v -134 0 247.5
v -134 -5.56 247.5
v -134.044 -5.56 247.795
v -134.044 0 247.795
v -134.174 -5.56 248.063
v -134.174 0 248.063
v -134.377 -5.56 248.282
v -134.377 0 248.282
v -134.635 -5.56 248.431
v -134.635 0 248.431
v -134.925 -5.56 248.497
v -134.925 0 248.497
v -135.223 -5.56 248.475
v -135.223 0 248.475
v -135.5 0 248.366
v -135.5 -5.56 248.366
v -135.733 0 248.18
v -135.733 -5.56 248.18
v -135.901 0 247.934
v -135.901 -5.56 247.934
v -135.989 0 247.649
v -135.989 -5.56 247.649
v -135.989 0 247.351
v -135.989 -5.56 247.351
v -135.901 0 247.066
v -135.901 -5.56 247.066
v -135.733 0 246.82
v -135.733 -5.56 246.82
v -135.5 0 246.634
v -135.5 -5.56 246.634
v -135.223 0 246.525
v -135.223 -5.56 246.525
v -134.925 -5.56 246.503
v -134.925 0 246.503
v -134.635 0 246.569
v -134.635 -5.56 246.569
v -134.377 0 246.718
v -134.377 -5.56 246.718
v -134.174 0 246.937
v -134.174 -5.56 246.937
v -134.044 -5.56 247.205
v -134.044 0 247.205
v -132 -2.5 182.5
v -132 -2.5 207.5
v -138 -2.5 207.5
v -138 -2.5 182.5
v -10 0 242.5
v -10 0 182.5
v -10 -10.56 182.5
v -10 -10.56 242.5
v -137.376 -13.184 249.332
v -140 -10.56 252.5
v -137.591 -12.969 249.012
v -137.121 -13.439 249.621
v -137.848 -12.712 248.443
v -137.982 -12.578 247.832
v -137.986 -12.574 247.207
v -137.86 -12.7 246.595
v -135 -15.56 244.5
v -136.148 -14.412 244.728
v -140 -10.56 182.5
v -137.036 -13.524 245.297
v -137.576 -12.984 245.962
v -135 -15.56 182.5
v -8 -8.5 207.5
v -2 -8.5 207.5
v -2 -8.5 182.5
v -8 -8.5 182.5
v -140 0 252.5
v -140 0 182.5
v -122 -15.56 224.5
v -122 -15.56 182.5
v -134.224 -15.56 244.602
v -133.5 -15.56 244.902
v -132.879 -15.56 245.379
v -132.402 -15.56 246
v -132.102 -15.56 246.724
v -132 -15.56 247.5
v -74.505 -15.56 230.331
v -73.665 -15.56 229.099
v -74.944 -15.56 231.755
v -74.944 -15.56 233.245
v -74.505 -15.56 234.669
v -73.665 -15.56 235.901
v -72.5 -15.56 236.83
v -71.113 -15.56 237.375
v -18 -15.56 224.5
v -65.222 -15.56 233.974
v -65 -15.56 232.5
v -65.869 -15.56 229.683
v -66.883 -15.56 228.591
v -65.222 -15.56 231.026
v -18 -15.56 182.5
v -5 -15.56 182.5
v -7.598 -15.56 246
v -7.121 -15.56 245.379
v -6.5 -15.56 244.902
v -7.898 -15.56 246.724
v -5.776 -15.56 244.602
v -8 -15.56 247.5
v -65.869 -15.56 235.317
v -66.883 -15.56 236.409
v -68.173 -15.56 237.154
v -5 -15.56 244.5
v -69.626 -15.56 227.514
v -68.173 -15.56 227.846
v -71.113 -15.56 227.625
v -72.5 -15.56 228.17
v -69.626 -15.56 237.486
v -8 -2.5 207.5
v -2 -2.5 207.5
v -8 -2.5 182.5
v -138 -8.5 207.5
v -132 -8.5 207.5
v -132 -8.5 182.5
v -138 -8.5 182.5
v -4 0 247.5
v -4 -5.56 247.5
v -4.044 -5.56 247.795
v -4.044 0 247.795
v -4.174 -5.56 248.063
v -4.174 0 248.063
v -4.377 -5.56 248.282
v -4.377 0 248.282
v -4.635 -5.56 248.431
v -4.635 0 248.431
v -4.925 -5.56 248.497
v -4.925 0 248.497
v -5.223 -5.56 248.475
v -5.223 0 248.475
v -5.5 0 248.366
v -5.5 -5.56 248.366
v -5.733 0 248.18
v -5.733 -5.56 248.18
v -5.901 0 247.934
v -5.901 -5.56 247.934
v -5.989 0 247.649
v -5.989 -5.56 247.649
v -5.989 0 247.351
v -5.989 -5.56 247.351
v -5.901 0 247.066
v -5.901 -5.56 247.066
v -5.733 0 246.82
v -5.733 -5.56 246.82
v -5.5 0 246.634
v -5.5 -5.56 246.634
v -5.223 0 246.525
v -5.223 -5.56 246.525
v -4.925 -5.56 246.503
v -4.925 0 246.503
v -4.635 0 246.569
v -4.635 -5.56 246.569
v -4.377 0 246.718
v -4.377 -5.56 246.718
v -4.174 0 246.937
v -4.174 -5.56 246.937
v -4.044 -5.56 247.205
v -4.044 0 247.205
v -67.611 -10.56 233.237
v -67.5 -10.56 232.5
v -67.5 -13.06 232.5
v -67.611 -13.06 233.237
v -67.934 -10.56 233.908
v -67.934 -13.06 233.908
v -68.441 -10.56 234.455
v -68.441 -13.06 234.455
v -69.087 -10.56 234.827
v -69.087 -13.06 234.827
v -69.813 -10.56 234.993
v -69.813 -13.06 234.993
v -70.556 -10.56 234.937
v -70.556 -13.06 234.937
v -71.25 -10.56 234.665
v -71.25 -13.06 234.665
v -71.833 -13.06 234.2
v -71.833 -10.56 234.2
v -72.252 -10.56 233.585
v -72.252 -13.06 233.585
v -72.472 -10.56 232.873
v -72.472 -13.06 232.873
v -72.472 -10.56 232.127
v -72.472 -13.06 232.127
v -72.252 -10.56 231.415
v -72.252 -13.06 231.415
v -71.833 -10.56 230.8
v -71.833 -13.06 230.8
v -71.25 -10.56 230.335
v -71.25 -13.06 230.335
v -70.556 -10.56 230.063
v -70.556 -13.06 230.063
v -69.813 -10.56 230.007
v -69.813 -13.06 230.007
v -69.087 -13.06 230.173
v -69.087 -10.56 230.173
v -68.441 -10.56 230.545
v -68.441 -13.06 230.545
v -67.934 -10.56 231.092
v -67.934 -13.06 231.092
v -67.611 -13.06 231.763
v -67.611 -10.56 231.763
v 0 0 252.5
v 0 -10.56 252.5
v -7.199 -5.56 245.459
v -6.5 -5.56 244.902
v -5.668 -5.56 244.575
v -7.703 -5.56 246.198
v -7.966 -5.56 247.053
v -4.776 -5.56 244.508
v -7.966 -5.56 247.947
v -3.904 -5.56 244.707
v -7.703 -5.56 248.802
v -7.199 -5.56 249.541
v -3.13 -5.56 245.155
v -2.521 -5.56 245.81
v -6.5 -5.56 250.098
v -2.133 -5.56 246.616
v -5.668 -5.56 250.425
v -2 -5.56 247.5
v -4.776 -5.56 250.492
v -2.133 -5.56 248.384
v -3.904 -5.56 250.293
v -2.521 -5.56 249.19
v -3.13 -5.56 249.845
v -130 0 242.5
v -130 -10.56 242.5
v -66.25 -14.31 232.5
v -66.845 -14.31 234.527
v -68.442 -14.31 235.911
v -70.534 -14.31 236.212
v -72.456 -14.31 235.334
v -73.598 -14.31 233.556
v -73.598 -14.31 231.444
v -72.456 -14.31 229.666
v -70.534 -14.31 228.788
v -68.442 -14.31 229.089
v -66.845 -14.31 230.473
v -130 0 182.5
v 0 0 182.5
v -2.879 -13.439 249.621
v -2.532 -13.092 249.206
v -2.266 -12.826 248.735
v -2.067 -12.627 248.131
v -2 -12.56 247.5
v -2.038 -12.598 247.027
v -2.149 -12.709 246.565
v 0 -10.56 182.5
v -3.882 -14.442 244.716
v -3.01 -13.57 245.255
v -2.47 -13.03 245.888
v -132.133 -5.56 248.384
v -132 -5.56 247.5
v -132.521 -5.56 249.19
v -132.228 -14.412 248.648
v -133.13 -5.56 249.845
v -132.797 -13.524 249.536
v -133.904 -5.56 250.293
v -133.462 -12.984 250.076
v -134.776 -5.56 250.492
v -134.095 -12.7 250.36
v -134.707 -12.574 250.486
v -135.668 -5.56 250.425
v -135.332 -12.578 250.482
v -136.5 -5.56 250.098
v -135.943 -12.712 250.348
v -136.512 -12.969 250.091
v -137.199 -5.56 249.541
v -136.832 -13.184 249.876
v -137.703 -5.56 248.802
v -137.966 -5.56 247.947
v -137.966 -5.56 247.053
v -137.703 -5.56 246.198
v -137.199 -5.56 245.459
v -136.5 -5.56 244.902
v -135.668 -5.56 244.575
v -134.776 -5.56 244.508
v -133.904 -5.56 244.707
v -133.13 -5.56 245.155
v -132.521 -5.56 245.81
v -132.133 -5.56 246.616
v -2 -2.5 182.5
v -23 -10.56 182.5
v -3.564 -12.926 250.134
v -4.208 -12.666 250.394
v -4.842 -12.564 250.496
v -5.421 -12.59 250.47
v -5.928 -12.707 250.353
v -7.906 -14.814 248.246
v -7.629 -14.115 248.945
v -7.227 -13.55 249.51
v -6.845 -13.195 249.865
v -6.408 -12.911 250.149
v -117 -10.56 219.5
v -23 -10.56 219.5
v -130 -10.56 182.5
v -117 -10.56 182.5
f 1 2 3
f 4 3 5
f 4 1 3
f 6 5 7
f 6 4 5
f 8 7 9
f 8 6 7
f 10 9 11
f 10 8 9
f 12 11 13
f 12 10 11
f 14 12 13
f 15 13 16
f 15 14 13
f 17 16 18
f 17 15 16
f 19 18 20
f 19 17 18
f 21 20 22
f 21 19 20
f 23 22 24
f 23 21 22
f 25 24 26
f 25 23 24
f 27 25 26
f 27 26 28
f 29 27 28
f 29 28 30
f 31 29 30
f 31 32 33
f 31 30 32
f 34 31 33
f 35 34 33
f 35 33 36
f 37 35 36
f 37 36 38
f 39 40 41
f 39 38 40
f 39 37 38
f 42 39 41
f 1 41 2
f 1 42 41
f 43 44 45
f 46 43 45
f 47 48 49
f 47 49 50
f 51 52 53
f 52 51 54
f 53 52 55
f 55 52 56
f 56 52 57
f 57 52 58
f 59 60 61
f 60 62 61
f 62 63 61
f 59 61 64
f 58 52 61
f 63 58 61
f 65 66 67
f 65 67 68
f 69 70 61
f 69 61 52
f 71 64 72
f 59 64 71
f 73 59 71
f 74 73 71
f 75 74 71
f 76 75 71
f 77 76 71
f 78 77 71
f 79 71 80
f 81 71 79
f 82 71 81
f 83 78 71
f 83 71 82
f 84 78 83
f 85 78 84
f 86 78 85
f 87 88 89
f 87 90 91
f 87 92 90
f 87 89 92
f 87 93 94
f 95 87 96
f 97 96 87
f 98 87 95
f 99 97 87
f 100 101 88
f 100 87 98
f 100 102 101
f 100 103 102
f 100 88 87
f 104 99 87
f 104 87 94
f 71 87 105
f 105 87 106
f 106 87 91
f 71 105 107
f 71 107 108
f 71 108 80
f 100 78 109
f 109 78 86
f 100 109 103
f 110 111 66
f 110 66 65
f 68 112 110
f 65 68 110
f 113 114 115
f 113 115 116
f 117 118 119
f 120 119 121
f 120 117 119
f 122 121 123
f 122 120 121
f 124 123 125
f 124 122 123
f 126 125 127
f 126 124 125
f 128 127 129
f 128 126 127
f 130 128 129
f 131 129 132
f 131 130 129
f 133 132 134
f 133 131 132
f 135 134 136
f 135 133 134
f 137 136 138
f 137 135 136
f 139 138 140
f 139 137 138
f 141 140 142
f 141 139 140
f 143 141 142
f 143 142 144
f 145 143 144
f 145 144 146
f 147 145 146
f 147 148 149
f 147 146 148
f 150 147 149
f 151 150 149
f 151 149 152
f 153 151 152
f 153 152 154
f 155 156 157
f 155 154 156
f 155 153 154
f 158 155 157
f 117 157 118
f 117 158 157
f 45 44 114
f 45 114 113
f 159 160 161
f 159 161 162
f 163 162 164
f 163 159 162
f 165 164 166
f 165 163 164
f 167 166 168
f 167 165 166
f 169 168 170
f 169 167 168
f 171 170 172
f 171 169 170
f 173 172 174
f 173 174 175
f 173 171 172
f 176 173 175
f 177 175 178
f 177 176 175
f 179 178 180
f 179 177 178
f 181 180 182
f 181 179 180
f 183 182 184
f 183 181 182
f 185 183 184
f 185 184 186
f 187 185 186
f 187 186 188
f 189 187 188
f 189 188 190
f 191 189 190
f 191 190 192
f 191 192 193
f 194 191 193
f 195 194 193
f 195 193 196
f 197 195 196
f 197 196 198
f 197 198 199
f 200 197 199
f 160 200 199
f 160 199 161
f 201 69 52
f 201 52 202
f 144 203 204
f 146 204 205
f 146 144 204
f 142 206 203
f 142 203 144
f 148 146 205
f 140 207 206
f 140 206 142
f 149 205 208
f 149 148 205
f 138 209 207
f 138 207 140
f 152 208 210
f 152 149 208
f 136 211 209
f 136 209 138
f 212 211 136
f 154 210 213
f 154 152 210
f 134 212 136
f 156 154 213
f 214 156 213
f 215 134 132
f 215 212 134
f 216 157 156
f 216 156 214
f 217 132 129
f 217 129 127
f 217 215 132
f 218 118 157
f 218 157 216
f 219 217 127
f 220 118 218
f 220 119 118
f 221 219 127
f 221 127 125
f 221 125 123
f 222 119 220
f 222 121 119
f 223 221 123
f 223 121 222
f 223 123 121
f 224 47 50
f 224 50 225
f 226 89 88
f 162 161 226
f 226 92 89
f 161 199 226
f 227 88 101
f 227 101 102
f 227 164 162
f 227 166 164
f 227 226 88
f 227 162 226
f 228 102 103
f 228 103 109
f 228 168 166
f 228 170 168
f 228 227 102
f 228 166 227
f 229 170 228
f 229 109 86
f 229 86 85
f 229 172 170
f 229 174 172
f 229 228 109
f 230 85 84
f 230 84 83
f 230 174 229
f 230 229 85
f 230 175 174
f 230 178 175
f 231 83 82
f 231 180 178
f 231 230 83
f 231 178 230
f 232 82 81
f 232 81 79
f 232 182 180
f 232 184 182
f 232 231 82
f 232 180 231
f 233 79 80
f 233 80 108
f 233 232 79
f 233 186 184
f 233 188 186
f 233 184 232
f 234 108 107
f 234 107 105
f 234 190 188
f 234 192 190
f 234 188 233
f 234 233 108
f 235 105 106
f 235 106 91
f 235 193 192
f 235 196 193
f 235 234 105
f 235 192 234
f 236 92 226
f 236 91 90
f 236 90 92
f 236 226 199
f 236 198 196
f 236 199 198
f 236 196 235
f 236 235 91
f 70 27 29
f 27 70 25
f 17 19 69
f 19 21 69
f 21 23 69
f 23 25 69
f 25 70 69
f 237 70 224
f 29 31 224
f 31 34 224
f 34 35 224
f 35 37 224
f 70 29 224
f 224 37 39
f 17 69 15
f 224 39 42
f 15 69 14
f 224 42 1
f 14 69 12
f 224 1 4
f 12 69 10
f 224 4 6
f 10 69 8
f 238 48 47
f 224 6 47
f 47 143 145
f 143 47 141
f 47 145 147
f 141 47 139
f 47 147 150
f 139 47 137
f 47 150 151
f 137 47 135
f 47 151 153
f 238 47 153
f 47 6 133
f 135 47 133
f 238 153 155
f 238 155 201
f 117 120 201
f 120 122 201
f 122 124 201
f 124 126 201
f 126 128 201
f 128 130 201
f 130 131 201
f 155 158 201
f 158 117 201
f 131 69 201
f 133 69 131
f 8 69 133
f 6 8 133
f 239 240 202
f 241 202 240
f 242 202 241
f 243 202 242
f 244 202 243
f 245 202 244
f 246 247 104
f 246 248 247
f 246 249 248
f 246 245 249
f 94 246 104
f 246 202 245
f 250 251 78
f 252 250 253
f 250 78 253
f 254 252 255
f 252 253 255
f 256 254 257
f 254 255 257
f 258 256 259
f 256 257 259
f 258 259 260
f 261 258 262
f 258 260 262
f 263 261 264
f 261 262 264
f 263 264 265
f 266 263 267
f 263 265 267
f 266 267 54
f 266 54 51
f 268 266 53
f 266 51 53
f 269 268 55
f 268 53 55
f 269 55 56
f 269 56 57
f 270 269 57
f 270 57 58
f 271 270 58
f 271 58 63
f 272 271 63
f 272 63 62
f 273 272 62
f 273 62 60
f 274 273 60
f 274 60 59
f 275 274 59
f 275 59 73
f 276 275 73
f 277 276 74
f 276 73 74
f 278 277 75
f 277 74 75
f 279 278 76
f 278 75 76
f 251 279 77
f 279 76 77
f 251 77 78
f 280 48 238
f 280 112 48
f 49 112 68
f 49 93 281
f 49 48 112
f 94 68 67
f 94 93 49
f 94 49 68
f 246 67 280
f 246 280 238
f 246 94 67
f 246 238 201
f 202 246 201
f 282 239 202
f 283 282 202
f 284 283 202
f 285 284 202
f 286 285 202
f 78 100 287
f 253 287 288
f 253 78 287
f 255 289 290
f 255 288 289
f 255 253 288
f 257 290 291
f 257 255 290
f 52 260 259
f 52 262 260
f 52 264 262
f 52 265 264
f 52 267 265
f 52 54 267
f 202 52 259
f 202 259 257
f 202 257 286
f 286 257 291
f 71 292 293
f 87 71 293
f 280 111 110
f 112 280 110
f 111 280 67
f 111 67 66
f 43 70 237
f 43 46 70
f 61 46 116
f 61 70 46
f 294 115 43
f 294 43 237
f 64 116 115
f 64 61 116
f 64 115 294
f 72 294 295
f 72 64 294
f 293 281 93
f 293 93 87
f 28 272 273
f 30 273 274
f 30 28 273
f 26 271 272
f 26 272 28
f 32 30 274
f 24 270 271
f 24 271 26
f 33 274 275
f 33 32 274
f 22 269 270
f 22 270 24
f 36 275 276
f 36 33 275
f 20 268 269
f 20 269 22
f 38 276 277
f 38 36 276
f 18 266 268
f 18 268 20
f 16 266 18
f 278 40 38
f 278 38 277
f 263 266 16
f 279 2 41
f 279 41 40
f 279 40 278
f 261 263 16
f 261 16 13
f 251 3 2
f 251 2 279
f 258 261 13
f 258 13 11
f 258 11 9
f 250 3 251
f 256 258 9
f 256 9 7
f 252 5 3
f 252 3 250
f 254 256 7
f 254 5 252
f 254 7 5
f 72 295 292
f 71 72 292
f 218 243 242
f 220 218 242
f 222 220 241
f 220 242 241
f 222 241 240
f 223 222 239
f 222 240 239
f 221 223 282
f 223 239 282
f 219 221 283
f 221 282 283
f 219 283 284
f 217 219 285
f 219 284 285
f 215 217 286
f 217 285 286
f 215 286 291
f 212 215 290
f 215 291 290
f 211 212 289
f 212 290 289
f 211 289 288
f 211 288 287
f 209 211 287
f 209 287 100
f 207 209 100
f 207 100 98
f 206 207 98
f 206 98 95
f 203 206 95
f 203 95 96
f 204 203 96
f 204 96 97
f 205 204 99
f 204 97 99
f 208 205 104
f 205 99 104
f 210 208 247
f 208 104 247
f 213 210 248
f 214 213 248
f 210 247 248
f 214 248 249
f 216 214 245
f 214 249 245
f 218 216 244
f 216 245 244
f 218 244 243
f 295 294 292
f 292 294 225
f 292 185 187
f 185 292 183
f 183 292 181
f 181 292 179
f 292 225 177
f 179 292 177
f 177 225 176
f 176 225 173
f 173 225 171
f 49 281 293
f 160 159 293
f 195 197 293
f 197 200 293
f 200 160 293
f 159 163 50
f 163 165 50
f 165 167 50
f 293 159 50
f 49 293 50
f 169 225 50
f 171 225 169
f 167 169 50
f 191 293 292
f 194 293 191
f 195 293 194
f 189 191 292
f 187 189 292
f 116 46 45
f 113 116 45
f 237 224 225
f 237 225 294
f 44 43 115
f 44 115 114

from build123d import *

# Parameters (mm, degrees)
F0_W        = 140
F0_H        = 252.5
F0_R        = 1
F0_W_2      = 94
F0_H_2      = 152.5
F0_R_2      = 2.5
F0_W_3      = 12
F0_H_3      = 34
F1_DEPTH    = 15.56
F2_DEPTH    = 10.56
F3_T1_DEPTH = 165.7168298797
F3_T3_DEPTH = 278.2168298797
F4_SIZE     = 2.5
F5_R        = 3
F6_DEPTH    = 10
F7_SIZE     = 4.99999
F8_W        = 161.2529857084
F8_H        = 182.5
F9_DEPTH    = 25
F11_W       = 6
F11_H       = 50
F12_DEPTH   = 6


# Not quite as in the source:
# - a fillet or chamfer that OpenCascade refuses, or shapes differently, is made with other operations: its cross-section is extruded or revolved along the edge and cut away or added
# - a fillet or chamfer is up to 0.001 mm smaller than in the source, because OpenCascade refuses the exact size
# - a feature names something its author has since deleted; it is built from what else it names


with BuildPart() as f1:
    # F0 (on Front) → F1 (new body)
    with BuildSketch(Plane.XZ):
        with Locations((-70, 126.25)):
            Rectangle(F0_W, F0_H)
        with Locations((-135, 5)):
            Circle(F0_R, mode=Mode.SUBTRACT)
        with Locations((-5, 5)):
            Circle(F0_R, mode=Mode.SUBTRACT)
        with Locations((-135, 247.5)):
            Circle(F0_R, mode=Mode.SUBTRACT)
        Polygon((-130, 44), (-130, 242.5), (-10, 242.5), (-10, 44), (-64, 44), (-64, 10), (-76, 10), (-76, 44), align=None, mode=Mode.SUBTRACT)
        with Locations((-5, 247.5)):
            Circle(F0_R, mode=Mode.SUBTRACT)
        Polygon((-10, 242.5), (-130, 242.5), (-130, 44), (-76, 44), (-64, 44), (-10, 44), align=None)
        with Locations((-70, 143.25)):
            Rectangle(F0_W_2, F0_H_2, mode=Mode.SUBTRACT)
        with Locations((-70, 232.5)):
            Circle(F0_R_2, mode=Mode.SUBTRACT)
        with Locations((-70, 27)):
            Rectangle(F0_W_3, F0_H_3)
    extrude(amount=F1_DEPTH)

    # F0 (on Front) → F2 (cut)
    with BuildSketch(Plane.XZ):
        Polygon((-10, 242.5), (-130, 242.5), (-130, 44), (-76, 44), (-64, 44), (-10, 44), align=None)
        with Locations((-70, 143.25)):
            Rectangle(F0_W_2, F0_H_2, mode=Mode.SUBTRACT)
        with Locations((-70, 232.5)):
            Circle(F0_R_2, mode=Mode.SUBTRACT)
        with Locations((-70, 27)):
            Rectangle(F0_W_3, F0_H_3)
    extrude(amount=F2_DEPTH, mode=Mode.SUBTRACT)

    # F3: chamfer of 5 on 4 edges, made by hand

    # F3_s2 → F3_t1 (cut)
    with BuildSketch(Plane.YZ.offset(-152.8584149398)):
        Polygon((-10.56, 0), (-15.56, 5), (-15.56, 0), align=None)
        Polygon((-15.56, 247.5), (-10.56, 252.5), (-15.56, 252.5), align=None)
    extrude(amount=F3_T1_DEPTH, mode=Mode.SUBTRACT)

    # F3_s4 → F3_t3 (cut)
    with BuildSketch(Plane.XY.offset(-12.8584149398)):
        Polygon((-140, -10.56), (-135, -15.56), (-140, -15.56), align=None)
        Polygon((0, -10.56), (-5, -15.56), (0, -15.56), align=None)
    extrude(amount=F3_T3_DEPTH, mode=Mode.SUBTRACT)

    # F4
    f4_edges = [f1.edges().sort_by_distance(p)[0] for p in [
        (-72.5, -15.56, 232.5),
    ]]
    chamfer(f4_edges, length=F4_SIZE)

    # F5 (on face) → F6 (cut)
    with BuildSketch(Plane.XZ.offset(15.56)):
        with Locations((-135, 247.5)):
            Circle(F5_R)
        with Locations((-135, 5)):
            Circle(F5_R)
        with Locations((-5, 247.5)):
            Circle(F5_R)
        with Locations((-5, 5)):
            Circle(F5_R)
    extrude(amount=-F6_DEPTH, mode=Mode.SUBTRACT)

    # F7 (size 5 in the source; OpenCascade refuses exactly that, so slightly less here)
    f7_edges = [f1.edges().sort_by_distance(p)[0] for p in [
        (-70, -15.56, 67),
        (-117, -15.56, 143.25),
        (-23, -15.56, 143.25),
        (-70, -15.56, 219.5),
    ]]
    chamfer(f7_edges, length=F7_SIZE)

    # F8 (on face) → F9 (cut)
    with BuildSketch(Plane.XZ.offset(15.56)):
        with Locations((-74.815297965, 91.25)):
            Rectangle(F8_W, F8_H)
    extrude(amount=-F9_DEPTH, mode=Mode.SUBTRACT)

    # F11 (on offset) → F12 (cut)
    with BuildSketch(Plane(origin=(0, -2.5, 0), x_dir=(-1, 0, 0), z_dir=(0, 1, 0))):
        with Locations((135, 182.5)):
            Rectangle(F11_W, F11_H)
        with Locations((5, 182.5)):
            Rectangle(F11_W, F11_H)
    extrude(amount=-F12_DEPTH, mode=Mode.SUBTRACT)


solid = f1.part
